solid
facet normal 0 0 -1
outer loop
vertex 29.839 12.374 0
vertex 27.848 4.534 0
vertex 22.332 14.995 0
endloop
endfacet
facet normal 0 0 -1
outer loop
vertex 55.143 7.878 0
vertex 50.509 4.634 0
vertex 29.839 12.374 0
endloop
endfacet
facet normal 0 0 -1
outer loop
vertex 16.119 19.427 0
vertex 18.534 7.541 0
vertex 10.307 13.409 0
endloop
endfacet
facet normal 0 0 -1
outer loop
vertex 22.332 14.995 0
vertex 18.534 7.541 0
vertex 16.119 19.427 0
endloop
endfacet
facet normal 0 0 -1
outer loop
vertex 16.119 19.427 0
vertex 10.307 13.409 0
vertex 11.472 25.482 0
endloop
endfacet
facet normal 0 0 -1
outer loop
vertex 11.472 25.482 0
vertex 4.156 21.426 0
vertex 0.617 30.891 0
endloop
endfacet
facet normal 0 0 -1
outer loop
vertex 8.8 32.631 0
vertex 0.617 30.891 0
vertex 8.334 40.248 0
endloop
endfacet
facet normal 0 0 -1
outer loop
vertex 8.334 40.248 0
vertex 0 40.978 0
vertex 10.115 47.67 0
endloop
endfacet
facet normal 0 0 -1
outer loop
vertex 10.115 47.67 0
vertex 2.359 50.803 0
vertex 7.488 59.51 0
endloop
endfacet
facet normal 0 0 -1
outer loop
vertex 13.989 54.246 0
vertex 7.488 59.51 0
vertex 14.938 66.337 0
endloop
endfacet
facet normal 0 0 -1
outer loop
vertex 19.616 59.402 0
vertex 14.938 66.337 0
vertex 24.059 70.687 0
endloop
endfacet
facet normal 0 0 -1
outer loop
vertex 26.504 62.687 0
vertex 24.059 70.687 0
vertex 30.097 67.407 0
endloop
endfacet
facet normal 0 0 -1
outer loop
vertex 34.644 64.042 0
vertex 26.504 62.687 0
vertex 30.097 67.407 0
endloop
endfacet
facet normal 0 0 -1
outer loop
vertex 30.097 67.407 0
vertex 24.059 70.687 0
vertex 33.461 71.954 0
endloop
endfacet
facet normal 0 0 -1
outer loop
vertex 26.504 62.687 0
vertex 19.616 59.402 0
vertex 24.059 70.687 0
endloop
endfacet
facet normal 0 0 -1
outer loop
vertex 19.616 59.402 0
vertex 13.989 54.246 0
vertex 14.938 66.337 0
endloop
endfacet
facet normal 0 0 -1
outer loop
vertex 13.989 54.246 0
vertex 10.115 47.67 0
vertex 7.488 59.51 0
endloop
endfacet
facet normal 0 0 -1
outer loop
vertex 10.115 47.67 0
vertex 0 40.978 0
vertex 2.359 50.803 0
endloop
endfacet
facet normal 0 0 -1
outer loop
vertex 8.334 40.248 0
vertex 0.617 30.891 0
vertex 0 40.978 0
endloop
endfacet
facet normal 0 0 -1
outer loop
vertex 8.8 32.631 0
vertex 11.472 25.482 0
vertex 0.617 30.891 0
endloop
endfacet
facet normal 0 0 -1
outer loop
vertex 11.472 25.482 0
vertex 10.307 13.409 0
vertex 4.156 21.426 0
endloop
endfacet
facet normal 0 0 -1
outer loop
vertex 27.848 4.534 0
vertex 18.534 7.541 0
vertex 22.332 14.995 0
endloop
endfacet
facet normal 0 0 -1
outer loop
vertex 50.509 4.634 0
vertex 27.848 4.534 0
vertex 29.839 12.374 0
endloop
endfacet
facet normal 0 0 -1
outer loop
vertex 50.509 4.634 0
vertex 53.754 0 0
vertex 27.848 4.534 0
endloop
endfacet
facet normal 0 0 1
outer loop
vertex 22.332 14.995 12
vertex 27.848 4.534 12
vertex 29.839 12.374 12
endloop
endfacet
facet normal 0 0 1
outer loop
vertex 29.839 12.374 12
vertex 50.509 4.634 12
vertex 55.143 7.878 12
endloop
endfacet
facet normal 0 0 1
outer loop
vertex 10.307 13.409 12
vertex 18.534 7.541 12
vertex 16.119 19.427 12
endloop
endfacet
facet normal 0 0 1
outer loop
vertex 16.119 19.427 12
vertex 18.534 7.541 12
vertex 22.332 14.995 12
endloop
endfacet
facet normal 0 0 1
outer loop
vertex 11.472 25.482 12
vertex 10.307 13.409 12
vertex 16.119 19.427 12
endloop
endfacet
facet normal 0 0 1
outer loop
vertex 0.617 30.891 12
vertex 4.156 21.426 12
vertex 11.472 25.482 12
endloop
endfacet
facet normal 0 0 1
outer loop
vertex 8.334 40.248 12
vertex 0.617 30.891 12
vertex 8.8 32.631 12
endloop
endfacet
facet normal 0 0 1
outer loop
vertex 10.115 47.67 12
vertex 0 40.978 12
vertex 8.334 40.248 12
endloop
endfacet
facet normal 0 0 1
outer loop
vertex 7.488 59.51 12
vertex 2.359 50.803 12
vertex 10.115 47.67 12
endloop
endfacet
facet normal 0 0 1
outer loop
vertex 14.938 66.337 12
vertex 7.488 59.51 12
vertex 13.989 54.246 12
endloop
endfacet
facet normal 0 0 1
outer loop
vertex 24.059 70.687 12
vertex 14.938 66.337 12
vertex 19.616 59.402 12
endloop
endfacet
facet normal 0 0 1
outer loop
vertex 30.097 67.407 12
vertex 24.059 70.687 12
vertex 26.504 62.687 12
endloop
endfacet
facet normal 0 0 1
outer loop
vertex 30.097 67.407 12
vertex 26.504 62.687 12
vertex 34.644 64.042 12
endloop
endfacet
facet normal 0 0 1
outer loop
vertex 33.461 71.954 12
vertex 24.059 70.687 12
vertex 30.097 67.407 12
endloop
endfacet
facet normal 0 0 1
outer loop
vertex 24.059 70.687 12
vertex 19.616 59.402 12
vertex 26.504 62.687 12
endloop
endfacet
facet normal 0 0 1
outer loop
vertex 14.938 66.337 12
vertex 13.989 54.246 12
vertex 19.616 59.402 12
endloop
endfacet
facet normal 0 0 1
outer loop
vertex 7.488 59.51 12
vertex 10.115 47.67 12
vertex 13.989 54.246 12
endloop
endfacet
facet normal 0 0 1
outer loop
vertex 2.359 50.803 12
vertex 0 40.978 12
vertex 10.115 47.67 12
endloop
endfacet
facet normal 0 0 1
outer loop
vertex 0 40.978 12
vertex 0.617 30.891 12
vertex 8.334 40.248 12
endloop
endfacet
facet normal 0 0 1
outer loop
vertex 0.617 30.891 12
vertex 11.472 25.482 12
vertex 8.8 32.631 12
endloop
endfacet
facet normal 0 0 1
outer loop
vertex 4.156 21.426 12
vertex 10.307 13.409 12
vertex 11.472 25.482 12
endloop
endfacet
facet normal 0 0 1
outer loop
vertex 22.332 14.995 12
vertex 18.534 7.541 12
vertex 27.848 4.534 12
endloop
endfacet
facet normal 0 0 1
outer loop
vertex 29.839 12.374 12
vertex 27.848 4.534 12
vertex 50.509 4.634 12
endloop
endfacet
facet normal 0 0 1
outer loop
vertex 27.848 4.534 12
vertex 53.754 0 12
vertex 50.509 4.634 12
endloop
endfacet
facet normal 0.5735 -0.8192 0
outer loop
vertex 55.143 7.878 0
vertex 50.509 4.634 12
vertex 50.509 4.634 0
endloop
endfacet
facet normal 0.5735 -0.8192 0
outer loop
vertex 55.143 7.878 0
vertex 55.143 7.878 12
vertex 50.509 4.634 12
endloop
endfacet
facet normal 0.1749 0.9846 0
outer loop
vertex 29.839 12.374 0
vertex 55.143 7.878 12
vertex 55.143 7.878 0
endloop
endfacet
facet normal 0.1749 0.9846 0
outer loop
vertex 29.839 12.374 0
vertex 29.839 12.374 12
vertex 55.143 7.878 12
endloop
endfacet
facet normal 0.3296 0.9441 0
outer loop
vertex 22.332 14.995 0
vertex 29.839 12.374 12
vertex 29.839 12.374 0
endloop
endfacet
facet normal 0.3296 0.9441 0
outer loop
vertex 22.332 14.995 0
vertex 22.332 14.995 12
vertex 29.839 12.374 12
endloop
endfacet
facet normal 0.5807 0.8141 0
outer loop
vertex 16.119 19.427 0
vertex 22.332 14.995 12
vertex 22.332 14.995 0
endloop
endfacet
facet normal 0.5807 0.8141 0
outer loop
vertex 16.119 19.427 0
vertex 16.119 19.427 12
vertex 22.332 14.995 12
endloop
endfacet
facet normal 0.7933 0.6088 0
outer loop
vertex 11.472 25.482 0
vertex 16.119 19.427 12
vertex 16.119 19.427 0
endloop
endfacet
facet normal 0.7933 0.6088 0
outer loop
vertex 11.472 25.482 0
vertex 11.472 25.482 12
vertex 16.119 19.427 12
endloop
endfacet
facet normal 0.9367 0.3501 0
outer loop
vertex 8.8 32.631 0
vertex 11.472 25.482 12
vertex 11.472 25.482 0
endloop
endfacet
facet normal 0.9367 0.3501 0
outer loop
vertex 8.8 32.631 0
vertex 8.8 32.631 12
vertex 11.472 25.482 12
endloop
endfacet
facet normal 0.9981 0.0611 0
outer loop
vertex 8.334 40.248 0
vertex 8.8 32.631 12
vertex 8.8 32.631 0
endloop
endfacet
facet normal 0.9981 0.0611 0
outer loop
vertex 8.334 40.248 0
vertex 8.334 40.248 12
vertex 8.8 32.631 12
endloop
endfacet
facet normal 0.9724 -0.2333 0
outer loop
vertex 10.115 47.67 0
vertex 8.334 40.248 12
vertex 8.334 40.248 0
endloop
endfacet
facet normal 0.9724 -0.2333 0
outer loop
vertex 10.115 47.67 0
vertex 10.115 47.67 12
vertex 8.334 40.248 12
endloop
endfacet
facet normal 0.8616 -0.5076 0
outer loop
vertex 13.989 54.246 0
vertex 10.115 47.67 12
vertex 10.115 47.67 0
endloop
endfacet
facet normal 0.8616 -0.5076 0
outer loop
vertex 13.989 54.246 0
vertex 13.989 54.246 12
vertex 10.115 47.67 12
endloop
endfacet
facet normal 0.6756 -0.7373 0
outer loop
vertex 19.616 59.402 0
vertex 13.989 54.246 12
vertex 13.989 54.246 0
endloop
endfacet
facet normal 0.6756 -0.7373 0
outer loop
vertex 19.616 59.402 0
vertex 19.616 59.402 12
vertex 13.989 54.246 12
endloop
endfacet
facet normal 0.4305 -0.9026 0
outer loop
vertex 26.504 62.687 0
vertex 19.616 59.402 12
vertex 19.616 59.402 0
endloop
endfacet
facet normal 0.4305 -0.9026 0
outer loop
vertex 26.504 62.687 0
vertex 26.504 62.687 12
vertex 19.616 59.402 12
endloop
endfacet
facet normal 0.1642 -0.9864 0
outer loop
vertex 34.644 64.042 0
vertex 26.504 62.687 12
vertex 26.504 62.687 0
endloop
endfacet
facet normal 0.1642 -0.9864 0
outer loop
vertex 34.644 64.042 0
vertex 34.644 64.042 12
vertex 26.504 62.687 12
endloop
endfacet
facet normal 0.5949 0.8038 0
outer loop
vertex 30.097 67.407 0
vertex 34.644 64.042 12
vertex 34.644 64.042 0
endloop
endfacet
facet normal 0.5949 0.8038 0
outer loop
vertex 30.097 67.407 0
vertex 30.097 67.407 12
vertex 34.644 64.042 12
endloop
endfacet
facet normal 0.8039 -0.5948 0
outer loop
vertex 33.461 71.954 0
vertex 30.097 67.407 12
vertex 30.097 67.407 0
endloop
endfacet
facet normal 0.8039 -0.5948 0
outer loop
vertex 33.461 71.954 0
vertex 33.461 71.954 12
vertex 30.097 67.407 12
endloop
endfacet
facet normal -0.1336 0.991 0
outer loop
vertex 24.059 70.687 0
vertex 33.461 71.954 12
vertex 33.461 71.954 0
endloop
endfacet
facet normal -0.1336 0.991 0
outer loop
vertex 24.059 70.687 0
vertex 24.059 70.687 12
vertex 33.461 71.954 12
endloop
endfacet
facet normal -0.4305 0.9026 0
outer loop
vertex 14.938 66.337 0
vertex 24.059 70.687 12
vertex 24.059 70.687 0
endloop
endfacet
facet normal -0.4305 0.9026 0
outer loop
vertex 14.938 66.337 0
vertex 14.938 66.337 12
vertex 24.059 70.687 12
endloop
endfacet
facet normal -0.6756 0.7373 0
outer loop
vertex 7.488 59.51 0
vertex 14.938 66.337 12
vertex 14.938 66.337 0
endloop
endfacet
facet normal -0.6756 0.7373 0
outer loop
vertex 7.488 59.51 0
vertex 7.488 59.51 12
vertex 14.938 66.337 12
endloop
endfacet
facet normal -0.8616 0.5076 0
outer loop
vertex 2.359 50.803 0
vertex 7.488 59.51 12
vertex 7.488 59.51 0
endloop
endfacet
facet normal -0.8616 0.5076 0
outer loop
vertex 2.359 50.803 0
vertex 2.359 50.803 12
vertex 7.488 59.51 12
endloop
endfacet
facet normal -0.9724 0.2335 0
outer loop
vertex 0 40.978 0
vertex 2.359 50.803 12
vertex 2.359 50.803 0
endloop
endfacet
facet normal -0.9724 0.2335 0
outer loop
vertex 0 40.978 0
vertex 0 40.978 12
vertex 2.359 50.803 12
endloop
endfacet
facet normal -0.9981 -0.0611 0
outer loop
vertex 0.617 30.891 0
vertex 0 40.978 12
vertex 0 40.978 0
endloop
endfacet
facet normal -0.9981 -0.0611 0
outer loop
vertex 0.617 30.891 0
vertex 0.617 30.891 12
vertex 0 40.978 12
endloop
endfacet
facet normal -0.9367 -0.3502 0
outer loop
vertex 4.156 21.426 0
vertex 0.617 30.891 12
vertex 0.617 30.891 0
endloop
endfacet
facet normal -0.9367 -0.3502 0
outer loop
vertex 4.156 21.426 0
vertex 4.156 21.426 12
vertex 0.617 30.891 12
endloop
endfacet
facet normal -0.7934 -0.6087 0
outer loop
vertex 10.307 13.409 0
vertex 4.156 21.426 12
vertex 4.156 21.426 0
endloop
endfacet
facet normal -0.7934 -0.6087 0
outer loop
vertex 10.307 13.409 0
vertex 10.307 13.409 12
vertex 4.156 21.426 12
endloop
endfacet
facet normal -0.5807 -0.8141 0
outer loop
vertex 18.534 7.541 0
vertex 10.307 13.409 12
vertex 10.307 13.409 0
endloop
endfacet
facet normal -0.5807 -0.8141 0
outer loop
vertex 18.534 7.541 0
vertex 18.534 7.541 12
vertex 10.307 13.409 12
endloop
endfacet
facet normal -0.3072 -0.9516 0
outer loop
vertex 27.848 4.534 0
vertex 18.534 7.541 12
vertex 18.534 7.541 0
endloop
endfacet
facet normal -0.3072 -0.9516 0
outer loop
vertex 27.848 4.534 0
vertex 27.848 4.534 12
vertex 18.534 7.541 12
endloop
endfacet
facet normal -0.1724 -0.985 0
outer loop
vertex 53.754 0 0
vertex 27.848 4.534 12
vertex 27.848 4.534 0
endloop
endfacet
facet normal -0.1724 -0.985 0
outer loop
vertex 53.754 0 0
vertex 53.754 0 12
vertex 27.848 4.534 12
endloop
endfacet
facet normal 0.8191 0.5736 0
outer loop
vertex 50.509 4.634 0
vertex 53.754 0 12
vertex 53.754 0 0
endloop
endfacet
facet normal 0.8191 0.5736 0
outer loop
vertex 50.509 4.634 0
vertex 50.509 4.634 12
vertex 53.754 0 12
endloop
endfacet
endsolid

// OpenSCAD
$fn = 32;

// ----------------------------------------------------------------------
// Hook plate: curl radius 30 mm over 170 degrees, 8 mm thick band
// ----------------------------------------------------------------------

// --- parameters (mm) ---
profile_height = 12;      // extrusion height
profile_points = 26;      // points of the closed outline

profile = [[30.097, 67.407], [33.461, 71.954], [24.059, 70.687], [14.938, 66.337], [7.488, 59.51], [2.359, 50.803], [0, 40.978], [0.617, 30.891], [4.156, 21.426], [10.307, 13.409], [18.534, 7.541], [27.848, 4.534], [53.754, 0], [50.509, 4.634], [55.143, 7.878], [29.839, 12.374], [22.332, 14.995], [16.119, 19.427], [11.472, 25.482], [8.8, 32.631], [8.334, 40.248], [10.115, 47.67], [13.989, 54.246], [19.616, 59.402], [26.504, 62.687], [34.644, 64.042]];  // single closed polygon, 26 points, counter clockwise

// --- the one profile operation ---
linear_extrude(height = profile_height) polygon(points = profile);
